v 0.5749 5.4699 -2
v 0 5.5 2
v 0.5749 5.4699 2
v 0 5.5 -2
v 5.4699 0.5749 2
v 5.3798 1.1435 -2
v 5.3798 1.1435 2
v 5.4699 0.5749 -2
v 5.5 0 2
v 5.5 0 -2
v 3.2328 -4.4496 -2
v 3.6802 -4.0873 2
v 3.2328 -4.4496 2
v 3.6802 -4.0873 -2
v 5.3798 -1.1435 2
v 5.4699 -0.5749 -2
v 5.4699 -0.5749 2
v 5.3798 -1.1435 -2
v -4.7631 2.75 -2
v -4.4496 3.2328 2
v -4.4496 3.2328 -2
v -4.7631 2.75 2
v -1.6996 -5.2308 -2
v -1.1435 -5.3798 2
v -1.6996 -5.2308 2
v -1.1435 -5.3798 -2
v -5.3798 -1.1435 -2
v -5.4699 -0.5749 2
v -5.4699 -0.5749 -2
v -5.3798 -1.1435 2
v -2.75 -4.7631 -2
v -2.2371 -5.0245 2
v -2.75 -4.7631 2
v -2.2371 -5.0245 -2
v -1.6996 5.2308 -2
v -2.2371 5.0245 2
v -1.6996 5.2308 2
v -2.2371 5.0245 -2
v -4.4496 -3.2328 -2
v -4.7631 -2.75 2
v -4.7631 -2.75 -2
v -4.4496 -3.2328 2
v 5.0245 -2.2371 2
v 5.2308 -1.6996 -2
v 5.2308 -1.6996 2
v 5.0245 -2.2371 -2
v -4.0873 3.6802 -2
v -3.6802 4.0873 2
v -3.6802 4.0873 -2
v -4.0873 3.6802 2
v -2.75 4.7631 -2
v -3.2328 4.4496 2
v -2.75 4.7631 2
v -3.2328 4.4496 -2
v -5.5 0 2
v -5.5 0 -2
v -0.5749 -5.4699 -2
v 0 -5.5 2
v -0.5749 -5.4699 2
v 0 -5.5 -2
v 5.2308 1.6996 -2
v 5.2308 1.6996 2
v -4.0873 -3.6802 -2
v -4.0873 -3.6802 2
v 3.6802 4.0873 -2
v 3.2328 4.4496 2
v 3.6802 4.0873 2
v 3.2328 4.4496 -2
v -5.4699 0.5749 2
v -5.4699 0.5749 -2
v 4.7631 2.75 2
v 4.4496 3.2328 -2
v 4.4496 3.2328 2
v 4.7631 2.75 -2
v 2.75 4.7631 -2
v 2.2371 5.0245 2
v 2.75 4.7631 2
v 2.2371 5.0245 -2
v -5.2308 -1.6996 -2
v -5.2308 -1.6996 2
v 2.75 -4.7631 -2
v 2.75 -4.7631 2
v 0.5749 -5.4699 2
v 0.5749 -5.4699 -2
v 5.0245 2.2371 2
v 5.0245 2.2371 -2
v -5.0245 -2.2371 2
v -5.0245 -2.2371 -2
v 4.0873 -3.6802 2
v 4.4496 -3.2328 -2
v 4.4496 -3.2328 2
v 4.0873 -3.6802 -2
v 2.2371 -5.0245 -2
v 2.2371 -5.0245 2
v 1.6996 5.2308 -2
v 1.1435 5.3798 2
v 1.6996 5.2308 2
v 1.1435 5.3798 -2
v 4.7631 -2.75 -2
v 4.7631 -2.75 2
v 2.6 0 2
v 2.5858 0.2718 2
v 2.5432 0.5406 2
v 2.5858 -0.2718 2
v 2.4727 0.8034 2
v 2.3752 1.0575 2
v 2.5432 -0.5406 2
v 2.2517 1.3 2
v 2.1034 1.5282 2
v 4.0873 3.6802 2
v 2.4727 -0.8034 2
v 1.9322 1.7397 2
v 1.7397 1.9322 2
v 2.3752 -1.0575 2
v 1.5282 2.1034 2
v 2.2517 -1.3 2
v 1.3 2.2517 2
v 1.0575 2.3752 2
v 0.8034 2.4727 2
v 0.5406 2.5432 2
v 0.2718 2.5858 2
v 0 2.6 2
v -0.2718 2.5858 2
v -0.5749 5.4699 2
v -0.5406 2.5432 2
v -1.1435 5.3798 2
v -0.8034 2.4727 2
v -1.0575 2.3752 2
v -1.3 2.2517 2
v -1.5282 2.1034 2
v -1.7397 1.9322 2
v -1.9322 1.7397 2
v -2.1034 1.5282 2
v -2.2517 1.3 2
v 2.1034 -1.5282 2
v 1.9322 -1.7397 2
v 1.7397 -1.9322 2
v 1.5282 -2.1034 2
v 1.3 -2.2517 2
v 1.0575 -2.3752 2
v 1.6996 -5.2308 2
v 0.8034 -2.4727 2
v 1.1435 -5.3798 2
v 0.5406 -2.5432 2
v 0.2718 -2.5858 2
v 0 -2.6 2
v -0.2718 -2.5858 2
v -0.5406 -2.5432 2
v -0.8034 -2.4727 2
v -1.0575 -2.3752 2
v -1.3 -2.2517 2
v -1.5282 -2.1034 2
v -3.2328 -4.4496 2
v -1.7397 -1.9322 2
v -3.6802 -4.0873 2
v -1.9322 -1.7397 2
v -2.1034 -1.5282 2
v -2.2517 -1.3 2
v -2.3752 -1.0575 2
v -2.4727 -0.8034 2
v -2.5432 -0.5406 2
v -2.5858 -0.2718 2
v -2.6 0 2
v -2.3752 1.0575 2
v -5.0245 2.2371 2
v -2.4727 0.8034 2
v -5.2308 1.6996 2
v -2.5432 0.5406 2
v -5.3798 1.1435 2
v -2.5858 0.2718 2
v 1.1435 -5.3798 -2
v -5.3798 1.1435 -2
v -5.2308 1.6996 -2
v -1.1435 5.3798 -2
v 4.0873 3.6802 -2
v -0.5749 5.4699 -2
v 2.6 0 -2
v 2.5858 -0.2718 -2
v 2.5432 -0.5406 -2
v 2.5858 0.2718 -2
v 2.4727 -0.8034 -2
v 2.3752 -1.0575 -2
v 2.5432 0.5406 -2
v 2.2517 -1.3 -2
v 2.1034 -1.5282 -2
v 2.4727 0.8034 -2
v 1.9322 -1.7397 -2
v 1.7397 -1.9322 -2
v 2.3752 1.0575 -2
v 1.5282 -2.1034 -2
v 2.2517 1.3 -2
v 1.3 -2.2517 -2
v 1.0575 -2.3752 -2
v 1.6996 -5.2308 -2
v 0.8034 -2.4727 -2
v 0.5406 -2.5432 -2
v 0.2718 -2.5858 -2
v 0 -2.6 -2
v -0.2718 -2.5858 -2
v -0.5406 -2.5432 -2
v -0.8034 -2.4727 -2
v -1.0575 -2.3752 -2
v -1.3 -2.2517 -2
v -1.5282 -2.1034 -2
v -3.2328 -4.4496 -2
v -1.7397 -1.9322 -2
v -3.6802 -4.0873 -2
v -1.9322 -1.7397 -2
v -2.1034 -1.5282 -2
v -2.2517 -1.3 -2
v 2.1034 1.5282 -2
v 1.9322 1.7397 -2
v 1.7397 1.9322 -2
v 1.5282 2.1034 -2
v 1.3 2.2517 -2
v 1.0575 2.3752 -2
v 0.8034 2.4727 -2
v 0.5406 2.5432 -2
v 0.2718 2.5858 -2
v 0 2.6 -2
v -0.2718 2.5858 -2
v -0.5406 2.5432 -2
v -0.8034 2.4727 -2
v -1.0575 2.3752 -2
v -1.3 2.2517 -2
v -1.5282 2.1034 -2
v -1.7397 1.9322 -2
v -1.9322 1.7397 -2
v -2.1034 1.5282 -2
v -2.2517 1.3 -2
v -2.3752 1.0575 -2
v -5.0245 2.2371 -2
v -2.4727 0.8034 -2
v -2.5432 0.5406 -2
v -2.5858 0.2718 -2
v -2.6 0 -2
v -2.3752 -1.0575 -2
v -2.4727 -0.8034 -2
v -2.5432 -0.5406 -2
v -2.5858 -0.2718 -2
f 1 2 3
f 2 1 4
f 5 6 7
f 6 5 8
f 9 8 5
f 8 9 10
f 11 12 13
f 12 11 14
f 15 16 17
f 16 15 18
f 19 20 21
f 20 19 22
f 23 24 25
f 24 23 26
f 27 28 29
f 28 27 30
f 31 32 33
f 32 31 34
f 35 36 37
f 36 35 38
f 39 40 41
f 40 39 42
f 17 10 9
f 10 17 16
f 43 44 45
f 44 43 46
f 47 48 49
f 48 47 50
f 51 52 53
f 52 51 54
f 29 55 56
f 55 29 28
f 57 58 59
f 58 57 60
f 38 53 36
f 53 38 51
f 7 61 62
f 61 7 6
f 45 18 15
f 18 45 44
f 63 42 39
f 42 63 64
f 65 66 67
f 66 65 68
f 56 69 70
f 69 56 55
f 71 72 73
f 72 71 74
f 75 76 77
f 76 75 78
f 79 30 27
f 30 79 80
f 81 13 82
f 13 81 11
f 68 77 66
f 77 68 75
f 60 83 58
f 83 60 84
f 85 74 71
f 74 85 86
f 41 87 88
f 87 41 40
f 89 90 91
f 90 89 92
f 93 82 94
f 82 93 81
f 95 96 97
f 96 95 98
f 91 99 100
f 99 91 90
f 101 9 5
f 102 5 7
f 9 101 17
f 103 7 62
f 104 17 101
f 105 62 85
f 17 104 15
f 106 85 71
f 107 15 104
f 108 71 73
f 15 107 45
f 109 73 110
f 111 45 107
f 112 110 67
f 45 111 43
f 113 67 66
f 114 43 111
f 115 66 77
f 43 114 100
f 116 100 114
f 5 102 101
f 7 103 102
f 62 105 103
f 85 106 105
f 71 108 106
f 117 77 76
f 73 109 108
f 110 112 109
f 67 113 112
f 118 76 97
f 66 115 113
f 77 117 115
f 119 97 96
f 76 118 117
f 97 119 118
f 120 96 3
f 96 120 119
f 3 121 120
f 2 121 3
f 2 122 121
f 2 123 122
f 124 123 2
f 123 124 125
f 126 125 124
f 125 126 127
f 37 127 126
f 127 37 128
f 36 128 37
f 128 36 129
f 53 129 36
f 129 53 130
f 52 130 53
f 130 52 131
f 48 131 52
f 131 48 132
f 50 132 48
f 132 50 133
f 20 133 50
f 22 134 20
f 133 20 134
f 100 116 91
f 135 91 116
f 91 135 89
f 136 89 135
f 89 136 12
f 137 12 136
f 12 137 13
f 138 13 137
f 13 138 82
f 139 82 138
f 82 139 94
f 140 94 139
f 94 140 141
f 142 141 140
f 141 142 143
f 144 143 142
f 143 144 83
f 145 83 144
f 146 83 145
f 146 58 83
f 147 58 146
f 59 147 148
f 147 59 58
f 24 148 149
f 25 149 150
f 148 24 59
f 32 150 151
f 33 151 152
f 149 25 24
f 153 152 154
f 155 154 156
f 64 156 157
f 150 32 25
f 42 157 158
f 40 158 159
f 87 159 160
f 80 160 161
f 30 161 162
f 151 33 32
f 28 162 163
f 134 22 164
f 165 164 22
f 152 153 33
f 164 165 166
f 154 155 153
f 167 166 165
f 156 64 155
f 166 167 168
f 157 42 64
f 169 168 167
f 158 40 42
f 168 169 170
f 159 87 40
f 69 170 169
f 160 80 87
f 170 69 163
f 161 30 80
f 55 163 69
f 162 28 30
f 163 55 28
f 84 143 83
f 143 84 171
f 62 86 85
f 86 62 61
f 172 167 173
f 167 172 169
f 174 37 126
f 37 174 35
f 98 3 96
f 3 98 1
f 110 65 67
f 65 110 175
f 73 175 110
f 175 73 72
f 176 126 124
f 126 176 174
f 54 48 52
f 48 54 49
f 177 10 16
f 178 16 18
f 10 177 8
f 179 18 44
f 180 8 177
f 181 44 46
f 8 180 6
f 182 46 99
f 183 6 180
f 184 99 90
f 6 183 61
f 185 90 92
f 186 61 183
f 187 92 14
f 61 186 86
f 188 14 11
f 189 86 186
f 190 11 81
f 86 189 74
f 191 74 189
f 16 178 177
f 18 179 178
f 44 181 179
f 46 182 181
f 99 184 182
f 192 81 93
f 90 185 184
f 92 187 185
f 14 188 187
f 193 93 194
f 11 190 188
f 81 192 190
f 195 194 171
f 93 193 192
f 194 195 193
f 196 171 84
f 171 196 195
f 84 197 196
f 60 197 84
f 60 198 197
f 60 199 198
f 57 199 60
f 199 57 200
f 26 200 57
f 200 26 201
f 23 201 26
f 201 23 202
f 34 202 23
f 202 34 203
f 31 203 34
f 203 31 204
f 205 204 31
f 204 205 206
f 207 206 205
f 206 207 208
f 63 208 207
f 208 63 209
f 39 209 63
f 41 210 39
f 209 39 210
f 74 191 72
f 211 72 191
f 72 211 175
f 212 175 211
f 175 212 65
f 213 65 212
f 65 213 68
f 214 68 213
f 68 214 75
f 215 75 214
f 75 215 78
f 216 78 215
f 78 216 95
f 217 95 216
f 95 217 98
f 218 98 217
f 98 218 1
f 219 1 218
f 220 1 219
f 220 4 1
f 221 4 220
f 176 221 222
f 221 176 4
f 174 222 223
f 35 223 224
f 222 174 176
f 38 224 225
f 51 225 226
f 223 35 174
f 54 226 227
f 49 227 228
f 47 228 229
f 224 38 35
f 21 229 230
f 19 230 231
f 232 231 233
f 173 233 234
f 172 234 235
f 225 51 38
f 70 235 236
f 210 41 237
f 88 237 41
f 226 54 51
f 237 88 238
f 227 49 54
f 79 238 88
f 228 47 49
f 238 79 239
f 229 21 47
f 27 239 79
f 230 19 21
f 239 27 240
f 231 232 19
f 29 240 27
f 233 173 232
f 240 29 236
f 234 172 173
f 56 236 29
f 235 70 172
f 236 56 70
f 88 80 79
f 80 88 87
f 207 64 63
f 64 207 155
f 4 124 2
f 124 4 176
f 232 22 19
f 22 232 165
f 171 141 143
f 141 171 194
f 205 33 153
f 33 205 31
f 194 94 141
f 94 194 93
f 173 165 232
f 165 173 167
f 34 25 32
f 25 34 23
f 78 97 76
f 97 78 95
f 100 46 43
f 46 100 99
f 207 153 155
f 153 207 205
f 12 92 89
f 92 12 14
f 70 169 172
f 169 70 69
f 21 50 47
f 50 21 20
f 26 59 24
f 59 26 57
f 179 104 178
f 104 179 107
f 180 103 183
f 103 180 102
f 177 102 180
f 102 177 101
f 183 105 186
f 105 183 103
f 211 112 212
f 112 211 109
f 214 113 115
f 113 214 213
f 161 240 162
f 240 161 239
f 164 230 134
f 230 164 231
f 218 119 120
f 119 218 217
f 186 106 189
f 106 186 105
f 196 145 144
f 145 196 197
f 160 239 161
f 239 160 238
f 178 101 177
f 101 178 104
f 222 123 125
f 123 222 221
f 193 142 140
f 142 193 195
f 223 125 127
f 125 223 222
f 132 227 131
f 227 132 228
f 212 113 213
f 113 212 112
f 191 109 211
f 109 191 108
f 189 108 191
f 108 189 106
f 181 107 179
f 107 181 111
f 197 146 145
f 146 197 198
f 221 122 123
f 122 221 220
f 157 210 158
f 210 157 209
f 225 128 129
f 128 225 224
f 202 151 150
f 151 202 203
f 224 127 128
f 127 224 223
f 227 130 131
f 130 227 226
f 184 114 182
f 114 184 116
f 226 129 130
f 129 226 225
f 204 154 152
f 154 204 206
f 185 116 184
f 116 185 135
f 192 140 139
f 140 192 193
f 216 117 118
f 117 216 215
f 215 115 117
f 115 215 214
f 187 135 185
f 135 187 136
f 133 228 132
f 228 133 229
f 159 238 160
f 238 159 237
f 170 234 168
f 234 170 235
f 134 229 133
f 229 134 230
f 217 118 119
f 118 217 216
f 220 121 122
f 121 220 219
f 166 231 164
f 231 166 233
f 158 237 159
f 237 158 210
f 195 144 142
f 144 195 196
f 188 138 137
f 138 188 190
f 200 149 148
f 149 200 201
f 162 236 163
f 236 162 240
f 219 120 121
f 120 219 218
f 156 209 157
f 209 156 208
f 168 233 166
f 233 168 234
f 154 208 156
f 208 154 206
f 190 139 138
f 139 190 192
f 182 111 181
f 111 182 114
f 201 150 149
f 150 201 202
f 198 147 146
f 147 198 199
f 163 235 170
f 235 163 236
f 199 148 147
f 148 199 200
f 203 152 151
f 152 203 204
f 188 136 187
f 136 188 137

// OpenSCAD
$fs=0.25;$fa=6;
difference(){cylinder(h=4, r=5.5, center=true);
cylinder(h=4, r=2.6, center=true);
}
